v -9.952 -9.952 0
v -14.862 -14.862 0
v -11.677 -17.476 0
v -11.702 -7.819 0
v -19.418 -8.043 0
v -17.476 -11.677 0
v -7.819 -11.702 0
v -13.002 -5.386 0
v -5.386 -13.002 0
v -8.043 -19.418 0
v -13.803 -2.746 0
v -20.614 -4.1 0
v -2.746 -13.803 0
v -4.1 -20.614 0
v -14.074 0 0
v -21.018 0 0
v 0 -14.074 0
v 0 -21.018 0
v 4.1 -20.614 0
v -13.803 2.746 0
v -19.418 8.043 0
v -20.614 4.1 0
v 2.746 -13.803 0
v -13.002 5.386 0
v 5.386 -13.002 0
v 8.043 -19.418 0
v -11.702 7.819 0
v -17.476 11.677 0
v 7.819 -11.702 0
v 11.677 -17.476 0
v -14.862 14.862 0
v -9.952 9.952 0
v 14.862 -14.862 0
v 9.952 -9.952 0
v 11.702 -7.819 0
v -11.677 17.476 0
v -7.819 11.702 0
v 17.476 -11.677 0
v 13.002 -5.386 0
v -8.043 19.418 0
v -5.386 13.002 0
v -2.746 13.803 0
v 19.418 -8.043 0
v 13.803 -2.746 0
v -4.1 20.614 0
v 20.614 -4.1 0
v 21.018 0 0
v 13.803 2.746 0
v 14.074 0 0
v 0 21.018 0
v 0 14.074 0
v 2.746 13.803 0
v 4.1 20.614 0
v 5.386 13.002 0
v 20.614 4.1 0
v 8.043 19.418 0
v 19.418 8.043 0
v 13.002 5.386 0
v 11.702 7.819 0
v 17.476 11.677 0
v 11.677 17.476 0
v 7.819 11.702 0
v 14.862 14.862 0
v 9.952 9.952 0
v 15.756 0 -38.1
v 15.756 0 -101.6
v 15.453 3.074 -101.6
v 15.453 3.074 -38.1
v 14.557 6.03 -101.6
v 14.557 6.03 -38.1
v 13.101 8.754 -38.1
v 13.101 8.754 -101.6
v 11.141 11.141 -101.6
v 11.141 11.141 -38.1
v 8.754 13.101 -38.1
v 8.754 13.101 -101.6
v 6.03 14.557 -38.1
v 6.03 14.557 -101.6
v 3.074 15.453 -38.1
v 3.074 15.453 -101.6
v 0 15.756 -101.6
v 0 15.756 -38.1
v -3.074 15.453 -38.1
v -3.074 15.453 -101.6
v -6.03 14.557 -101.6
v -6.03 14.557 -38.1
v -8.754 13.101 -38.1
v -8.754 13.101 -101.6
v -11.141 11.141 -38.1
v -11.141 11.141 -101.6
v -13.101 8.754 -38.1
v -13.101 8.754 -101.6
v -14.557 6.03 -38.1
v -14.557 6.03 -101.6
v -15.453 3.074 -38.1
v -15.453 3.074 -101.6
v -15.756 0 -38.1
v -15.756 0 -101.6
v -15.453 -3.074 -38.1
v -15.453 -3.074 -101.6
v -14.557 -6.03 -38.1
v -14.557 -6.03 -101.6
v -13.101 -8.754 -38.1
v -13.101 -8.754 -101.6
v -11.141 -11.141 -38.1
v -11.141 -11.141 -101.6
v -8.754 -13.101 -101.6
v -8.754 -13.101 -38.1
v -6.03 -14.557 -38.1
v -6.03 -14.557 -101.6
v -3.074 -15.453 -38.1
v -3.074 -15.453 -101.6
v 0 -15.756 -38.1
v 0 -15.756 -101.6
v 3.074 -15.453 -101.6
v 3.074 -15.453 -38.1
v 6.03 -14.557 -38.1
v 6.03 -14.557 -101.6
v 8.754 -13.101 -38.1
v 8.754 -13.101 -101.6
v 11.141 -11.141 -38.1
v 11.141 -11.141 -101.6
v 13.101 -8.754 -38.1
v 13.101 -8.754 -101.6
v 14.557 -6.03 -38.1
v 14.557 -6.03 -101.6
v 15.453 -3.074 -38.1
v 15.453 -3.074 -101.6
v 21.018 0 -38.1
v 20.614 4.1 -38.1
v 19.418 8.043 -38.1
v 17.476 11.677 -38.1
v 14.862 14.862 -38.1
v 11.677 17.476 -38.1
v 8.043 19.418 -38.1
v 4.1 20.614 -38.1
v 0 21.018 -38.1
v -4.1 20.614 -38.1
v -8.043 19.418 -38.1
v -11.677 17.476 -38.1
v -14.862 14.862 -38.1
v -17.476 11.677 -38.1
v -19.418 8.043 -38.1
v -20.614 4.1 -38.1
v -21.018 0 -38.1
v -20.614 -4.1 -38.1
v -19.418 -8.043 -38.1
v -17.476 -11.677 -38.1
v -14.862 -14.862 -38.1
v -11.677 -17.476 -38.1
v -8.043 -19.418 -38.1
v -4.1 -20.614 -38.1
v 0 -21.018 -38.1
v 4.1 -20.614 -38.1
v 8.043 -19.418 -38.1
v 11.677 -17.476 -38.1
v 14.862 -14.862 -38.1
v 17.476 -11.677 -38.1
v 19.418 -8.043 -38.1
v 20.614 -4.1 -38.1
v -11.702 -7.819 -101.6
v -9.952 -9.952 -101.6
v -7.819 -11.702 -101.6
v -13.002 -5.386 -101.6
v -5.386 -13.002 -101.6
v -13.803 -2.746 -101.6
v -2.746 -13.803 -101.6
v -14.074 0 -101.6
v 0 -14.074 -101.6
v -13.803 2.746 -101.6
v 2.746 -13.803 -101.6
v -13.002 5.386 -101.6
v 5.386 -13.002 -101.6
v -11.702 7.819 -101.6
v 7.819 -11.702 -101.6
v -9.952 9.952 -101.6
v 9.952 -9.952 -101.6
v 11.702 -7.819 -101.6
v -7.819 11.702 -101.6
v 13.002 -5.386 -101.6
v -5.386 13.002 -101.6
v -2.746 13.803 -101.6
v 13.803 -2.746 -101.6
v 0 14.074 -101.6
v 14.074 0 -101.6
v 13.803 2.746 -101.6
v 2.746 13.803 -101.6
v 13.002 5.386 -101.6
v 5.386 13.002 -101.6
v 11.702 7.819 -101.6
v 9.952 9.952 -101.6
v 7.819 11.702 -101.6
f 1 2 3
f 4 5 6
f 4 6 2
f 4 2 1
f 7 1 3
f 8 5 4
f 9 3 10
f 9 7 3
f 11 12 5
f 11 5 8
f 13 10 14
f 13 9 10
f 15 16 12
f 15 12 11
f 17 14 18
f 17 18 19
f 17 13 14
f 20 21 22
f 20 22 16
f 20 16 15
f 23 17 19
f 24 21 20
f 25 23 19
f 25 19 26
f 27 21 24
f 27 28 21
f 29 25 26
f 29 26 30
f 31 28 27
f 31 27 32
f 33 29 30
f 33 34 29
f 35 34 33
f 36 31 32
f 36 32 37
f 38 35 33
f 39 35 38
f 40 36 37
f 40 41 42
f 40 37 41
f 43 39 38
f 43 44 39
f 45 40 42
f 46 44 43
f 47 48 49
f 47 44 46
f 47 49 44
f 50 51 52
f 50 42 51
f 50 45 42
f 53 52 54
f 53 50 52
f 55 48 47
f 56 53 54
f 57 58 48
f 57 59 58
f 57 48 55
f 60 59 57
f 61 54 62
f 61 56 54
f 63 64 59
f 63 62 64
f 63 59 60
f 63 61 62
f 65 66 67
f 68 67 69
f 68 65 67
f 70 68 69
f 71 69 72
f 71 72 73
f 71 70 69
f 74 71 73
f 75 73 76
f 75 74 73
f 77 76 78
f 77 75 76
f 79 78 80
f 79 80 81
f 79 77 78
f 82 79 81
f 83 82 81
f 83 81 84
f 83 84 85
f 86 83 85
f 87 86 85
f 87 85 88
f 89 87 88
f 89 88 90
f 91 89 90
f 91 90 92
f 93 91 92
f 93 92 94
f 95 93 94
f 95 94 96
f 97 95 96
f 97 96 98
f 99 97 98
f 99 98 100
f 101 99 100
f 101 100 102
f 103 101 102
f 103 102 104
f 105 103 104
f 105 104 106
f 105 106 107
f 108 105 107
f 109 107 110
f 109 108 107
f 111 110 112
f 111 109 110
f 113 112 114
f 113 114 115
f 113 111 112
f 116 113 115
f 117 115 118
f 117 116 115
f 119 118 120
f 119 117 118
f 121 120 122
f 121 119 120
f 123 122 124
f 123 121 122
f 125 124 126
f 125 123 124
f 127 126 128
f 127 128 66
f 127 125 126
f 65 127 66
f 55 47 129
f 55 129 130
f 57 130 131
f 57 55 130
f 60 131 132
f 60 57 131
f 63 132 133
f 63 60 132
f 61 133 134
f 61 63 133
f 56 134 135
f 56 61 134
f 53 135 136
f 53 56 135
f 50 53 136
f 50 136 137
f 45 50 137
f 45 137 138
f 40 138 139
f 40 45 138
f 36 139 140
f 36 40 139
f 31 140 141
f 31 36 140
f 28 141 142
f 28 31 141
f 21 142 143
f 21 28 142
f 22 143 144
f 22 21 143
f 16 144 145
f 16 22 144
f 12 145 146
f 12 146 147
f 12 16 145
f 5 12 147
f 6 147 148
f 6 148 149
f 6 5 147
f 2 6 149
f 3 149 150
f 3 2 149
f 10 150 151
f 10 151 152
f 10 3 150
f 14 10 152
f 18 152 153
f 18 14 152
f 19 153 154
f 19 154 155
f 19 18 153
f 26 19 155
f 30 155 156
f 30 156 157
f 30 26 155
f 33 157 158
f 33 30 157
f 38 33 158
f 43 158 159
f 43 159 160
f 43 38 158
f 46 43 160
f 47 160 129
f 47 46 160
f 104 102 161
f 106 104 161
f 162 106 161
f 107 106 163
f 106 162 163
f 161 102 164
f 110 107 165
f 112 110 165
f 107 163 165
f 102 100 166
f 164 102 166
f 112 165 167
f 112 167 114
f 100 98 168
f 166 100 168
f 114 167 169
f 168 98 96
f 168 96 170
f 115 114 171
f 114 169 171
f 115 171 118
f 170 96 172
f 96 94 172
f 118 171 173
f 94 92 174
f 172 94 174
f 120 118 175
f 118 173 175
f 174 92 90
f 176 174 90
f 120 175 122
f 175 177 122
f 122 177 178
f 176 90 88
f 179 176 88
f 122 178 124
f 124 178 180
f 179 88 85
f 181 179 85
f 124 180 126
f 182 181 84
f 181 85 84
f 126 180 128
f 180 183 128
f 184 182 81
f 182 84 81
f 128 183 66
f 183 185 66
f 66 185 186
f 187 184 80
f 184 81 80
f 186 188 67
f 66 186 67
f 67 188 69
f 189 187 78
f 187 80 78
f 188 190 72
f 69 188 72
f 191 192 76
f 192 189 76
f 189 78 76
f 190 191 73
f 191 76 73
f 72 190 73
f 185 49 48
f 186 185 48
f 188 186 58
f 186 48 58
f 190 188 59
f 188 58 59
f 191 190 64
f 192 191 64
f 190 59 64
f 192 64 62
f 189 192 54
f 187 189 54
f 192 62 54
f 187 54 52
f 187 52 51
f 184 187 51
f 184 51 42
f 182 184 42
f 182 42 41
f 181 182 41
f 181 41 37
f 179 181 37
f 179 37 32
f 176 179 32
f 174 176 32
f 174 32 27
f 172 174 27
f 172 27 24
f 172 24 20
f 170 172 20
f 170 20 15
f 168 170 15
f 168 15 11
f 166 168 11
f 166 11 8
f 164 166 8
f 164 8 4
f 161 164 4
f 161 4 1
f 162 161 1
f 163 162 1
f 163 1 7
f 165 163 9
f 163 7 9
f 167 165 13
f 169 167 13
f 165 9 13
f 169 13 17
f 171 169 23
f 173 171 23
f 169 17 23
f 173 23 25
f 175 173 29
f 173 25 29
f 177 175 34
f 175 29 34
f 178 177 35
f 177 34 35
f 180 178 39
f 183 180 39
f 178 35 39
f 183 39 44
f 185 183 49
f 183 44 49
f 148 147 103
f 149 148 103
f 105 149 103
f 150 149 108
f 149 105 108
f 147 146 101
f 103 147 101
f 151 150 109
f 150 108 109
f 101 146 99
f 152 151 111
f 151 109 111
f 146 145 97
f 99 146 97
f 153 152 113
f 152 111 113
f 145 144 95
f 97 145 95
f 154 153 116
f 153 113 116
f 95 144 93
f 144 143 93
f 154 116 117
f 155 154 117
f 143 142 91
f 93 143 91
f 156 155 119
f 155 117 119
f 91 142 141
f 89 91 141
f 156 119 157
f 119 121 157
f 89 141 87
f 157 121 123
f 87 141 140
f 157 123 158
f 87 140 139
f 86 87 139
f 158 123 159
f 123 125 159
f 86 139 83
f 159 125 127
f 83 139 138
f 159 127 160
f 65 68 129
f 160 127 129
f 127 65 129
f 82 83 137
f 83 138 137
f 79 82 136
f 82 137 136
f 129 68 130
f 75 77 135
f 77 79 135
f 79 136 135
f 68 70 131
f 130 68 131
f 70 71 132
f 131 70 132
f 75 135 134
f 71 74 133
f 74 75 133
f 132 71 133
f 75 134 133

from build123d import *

# Parameters (mm, degrees)
F0_R     = 15.755887
F1_DEPTH = 101.6
F2_R     = 21.017988
F3_DEPTH = 38.1
F4_R     = 14.073652
F5_DEPTH = 101.601


with BuildPart() as f1:
    # F0 (on Top) → F1 (new body)
    with BuildSketch(Plane.XY):
        Circle(F0_R)
    extrude(amount=-F1_DEPTH)

    # F2 (on Top) → F3 (join)
    with BuildSketch(Plane.XY):
        Circle(F2_R)
    extrude(amount=-F3_DEPTH)

    # F4 (on face) → F5 (cut, through all)
    with BuildSketch(Plane.XY):
        Circle(F4_R)
    extrude(amount=-F5_DEPTH, mode=Mode.SUBTRACT)


solid = f1.part
